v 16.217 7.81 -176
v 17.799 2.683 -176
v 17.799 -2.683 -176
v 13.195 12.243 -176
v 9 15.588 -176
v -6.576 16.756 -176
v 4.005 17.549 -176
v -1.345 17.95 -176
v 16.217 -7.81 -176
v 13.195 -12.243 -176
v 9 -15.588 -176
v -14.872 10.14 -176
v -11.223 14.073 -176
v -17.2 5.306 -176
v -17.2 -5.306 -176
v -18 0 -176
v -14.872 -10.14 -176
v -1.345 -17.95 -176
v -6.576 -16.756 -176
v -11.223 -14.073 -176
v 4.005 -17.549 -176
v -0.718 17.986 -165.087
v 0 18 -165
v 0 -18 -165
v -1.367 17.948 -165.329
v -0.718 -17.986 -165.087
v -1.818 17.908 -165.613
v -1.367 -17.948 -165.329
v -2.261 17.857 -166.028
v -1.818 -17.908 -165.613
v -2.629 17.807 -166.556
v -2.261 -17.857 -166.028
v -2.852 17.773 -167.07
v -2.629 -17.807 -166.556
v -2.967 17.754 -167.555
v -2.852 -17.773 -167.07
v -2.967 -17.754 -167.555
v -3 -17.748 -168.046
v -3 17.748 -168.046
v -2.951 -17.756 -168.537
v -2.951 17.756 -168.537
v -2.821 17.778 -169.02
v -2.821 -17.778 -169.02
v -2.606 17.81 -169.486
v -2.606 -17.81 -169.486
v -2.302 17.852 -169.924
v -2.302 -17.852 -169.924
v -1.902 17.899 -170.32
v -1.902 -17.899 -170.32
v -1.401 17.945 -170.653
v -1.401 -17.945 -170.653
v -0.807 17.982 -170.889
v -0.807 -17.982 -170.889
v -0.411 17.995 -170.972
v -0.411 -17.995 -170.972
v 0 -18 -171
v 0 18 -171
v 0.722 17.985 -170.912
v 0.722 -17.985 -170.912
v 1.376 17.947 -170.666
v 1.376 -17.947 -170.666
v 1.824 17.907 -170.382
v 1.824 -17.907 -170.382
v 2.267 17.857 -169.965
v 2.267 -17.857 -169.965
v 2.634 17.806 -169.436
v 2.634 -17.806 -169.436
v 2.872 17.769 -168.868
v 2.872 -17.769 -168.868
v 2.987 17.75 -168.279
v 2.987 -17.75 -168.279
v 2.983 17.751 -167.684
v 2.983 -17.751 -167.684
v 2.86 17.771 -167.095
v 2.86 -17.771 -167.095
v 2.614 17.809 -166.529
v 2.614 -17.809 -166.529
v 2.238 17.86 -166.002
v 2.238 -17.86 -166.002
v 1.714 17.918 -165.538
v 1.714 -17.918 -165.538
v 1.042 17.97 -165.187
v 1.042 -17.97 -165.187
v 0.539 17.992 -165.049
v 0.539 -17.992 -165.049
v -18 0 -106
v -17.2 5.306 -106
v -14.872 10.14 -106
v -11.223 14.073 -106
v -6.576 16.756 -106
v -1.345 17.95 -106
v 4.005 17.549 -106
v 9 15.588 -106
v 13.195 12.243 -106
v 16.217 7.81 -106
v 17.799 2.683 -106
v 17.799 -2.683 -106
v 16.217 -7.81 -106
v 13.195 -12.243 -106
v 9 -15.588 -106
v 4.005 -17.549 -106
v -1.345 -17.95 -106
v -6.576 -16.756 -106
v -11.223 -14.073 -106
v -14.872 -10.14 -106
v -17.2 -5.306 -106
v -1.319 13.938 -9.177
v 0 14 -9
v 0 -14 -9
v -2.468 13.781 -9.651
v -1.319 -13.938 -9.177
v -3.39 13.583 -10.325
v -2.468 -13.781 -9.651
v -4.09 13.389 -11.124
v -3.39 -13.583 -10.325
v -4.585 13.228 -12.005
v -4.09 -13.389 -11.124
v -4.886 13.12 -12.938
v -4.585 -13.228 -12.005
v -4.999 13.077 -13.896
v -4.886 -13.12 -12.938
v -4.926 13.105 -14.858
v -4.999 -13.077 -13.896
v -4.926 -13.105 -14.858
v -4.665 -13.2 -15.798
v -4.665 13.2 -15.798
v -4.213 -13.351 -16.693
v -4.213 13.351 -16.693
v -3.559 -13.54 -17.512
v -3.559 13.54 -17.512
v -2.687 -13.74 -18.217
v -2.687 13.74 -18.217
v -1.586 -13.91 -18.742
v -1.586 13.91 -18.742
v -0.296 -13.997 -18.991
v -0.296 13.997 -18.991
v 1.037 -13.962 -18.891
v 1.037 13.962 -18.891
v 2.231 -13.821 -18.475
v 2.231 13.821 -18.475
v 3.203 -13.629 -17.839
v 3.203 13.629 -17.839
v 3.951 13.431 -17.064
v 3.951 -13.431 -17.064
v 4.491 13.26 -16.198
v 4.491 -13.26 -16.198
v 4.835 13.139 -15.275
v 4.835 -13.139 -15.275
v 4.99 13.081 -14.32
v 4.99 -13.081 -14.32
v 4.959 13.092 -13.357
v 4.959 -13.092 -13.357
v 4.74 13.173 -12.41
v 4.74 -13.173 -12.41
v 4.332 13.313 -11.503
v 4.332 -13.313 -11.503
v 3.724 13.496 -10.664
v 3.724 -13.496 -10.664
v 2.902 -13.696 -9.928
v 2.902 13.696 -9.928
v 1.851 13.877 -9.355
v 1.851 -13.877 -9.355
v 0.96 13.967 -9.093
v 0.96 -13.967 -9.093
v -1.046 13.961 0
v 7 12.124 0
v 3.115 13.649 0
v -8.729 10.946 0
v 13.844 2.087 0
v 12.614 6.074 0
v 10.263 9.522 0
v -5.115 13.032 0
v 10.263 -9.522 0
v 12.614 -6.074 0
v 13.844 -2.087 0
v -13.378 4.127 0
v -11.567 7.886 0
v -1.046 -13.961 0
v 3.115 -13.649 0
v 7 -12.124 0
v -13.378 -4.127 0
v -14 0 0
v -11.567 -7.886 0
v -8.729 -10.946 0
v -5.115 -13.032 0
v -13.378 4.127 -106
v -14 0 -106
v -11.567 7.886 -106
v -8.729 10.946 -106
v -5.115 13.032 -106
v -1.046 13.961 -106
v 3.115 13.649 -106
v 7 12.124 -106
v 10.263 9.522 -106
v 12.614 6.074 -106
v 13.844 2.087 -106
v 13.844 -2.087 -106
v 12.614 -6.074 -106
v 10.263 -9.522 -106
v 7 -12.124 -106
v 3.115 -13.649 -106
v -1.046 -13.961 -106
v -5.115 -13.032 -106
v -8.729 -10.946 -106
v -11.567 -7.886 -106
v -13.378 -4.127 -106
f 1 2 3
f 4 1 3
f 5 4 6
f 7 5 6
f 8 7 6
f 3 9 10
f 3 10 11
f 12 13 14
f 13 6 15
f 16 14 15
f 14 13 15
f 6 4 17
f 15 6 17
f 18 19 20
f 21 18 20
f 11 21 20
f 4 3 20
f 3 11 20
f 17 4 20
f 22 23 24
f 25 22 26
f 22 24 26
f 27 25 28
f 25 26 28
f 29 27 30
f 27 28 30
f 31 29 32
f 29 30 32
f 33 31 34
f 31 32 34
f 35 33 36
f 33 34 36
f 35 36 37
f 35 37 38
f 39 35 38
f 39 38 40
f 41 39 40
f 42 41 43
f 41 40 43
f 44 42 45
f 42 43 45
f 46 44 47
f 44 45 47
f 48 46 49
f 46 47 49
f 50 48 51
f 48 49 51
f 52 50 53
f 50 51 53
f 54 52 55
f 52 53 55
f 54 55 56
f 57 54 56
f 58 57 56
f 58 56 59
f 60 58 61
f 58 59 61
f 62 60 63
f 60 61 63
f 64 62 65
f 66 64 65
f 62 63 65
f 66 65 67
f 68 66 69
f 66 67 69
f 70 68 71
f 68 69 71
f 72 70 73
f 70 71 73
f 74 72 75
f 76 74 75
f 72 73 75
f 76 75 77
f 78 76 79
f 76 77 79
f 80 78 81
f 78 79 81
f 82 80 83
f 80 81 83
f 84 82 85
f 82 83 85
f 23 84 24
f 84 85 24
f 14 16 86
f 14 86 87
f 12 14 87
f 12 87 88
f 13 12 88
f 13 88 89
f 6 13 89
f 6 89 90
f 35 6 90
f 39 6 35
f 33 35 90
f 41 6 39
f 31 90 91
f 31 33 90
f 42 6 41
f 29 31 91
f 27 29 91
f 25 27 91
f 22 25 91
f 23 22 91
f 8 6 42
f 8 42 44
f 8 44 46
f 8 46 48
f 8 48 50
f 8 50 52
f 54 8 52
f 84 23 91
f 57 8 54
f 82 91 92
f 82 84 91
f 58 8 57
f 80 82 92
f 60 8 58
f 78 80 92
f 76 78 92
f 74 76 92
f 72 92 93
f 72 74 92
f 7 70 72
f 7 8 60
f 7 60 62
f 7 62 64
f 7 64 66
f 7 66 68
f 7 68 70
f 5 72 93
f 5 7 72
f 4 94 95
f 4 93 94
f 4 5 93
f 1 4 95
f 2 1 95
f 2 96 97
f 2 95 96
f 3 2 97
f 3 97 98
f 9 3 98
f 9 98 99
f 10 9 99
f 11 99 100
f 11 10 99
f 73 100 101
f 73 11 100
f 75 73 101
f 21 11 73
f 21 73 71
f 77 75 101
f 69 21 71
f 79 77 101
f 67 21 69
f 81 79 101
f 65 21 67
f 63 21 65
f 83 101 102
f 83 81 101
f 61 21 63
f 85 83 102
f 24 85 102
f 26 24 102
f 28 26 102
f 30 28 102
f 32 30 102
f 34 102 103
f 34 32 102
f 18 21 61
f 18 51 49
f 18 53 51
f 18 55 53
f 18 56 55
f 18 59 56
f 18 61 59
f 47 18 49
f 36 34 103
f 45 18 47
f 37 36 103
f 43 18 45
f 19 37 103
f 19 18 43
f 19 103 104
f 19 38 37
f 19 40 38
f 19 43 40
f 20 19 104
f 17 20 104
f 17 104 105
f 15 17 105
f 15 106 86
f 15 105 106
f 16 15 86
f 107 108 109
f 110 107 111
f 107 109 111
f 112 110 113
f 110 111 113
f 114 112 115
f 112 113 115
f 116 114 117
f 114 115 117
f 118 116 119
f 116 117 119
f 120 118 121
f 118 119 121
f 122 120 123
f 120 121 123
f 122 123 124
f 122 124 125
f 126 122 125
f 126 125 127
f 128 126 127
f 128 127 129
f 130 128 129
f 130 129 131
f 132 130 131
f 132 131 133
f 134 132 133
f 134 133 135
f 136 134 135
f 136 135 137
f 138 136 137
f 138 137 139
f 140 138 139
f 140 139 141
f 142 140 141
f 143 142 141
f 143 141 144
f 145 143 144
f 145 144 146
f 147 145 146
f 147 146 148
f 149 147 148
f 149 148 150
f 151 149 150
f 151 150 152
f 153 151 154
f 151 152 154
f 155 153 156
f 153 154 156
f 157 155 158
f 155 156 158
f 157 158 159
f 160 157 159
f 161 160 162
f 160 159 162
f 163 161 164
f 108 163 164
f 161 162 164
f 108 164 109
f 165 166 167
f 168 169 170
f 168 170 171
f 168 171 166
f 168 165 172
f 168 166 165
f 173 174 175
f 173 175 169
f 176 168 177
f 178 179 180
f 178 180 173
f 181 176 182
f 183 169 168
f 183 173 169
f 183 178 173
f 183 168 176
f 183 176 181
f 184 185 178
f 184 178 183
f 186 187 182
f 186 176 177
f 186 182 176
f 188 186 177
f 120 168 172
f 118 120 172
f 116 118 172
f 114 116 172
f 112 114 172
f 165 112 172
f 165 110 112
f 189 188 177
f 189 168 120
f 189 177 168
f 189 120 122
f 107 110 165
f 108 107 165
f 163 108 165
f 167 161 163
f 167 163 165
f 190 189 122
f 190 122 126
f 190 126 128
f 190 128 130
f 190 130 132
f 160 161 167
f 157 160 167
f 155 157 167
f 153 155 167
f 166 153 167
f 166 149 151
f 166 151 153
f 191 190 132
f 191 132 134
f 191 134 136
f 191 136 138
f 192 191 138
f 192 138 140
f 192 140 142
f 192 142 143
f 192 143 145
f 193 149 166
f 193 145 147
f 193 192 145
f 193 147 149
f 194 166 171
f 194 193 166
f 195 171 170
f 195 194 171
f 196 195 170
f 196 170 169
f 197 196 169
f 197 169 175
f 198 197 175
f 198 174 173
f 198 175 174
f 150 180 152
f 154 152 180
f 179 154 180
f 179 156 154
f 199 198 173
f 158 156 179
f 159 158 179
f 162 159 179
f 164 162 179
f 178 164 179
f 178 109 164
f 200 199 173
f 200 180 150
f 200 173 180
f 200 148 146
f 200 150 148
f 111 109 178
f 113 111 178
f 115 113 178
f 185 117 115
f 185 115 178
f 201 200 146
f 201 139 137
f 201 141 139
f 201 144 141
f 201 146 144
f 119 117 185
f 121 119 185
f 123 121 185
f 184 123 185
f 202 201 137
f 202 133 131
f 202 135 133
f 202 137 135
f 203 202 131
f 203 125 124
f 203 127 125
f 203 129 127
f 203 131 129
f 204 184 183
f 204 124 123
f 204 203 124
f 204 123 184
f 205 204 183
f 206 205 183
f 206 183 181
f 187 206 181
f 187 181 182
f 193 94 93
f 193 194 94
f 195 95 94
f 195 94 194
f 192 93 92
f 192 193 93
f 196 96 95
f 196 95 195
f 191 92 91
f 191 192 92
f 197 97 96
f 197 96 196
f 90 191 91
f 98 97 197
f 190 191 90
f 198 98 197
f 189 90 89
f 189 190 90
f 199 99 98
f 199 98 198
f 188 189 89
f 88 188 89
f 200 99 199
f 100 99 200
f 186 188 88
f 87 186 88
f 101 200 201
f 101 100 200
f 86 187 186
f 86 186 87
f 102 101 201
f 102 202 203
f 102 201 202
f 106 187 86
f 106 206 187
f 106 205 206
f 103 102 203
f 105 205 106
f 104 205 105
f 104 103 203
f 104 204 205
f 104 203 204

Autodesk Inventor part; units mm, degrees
ref_plane "YZ Plane" through (0, 0, 0) normal (1, 0, 0) x (0, 1, 0)
ref_plane "XY Plane" through (0, 0, 0) normal (0, 0, 1) x (1, 0, 0)
sketch "Skizze1" plane through (0, 0, 0) normal (0, 1, 0) x (-1, 0, 0)
  line L0 (0, 0) -> (14, 0)
  line L1 (14, 0) -> (14, -23)
  line L2 (14, -23) -> (14, -23)
  line L3 (14, -23) -> (14, -33)
  line L4 (14, -33) -> (14, -33)
  line L5 (14, -33) -> (14, -106)
  line L6 (14, -106) -> (18, -106)
  line L7 (18, -106) -> (18, -165)
  line L8 (18, -165) -> (18, -165)
  line L9 (18, -165) -> (18, -171)
  line L10 (18, -171) -> (18, -171)
  line L11 (18, -171) -> (18, -176)
  line L12 (18, -176) -> (0, -176)
  line L13 (0, -176) -> (0, 0)
  point P0 (18, -168)
  point P1 (18, -173.5)
  point P2 (14, -28)
  dimension "d3" = 36
  dimension "d6" = 78
  dimension "d8" = 28
  dimension "d12" = 176
  dimension "d13" = 36
  dimension "d14" = 70
revolve "Umdrehung1" add sketch "Skizze1" angle 360 about axis through (0, 0, -176) along (0, 0, 1)
ref_plane "Arbeitsebene1" through (0, 18, 0) normal (0, 1, 0) x (-1, 0, 0)
sketch "Skizze2" plane through (0, 18, 0) normal (0, 1, 0) x (-1, 0, 0)
  line L0 (18, -106) -> (-18, -106) projected
  line L1 (18, -176) -> (-18, -176) projected
  line L2 (14, 0) -> (-14, 0) projected
  point P0 (0, 0)
  point P1 (0, -168)
  point P2 (0, -176)
  point P3 (0, -14)
  dimension "d16" = 8
  dimension "d17" = 14
hole "Bohrung1" at (0, 18, -168) direction (0, -1, 0) diameter 6 end through all
hole "Bohrung2" at (0, 18, -14) direction (0, -1, 0) diameter 10 end through all
properties part number "18"
